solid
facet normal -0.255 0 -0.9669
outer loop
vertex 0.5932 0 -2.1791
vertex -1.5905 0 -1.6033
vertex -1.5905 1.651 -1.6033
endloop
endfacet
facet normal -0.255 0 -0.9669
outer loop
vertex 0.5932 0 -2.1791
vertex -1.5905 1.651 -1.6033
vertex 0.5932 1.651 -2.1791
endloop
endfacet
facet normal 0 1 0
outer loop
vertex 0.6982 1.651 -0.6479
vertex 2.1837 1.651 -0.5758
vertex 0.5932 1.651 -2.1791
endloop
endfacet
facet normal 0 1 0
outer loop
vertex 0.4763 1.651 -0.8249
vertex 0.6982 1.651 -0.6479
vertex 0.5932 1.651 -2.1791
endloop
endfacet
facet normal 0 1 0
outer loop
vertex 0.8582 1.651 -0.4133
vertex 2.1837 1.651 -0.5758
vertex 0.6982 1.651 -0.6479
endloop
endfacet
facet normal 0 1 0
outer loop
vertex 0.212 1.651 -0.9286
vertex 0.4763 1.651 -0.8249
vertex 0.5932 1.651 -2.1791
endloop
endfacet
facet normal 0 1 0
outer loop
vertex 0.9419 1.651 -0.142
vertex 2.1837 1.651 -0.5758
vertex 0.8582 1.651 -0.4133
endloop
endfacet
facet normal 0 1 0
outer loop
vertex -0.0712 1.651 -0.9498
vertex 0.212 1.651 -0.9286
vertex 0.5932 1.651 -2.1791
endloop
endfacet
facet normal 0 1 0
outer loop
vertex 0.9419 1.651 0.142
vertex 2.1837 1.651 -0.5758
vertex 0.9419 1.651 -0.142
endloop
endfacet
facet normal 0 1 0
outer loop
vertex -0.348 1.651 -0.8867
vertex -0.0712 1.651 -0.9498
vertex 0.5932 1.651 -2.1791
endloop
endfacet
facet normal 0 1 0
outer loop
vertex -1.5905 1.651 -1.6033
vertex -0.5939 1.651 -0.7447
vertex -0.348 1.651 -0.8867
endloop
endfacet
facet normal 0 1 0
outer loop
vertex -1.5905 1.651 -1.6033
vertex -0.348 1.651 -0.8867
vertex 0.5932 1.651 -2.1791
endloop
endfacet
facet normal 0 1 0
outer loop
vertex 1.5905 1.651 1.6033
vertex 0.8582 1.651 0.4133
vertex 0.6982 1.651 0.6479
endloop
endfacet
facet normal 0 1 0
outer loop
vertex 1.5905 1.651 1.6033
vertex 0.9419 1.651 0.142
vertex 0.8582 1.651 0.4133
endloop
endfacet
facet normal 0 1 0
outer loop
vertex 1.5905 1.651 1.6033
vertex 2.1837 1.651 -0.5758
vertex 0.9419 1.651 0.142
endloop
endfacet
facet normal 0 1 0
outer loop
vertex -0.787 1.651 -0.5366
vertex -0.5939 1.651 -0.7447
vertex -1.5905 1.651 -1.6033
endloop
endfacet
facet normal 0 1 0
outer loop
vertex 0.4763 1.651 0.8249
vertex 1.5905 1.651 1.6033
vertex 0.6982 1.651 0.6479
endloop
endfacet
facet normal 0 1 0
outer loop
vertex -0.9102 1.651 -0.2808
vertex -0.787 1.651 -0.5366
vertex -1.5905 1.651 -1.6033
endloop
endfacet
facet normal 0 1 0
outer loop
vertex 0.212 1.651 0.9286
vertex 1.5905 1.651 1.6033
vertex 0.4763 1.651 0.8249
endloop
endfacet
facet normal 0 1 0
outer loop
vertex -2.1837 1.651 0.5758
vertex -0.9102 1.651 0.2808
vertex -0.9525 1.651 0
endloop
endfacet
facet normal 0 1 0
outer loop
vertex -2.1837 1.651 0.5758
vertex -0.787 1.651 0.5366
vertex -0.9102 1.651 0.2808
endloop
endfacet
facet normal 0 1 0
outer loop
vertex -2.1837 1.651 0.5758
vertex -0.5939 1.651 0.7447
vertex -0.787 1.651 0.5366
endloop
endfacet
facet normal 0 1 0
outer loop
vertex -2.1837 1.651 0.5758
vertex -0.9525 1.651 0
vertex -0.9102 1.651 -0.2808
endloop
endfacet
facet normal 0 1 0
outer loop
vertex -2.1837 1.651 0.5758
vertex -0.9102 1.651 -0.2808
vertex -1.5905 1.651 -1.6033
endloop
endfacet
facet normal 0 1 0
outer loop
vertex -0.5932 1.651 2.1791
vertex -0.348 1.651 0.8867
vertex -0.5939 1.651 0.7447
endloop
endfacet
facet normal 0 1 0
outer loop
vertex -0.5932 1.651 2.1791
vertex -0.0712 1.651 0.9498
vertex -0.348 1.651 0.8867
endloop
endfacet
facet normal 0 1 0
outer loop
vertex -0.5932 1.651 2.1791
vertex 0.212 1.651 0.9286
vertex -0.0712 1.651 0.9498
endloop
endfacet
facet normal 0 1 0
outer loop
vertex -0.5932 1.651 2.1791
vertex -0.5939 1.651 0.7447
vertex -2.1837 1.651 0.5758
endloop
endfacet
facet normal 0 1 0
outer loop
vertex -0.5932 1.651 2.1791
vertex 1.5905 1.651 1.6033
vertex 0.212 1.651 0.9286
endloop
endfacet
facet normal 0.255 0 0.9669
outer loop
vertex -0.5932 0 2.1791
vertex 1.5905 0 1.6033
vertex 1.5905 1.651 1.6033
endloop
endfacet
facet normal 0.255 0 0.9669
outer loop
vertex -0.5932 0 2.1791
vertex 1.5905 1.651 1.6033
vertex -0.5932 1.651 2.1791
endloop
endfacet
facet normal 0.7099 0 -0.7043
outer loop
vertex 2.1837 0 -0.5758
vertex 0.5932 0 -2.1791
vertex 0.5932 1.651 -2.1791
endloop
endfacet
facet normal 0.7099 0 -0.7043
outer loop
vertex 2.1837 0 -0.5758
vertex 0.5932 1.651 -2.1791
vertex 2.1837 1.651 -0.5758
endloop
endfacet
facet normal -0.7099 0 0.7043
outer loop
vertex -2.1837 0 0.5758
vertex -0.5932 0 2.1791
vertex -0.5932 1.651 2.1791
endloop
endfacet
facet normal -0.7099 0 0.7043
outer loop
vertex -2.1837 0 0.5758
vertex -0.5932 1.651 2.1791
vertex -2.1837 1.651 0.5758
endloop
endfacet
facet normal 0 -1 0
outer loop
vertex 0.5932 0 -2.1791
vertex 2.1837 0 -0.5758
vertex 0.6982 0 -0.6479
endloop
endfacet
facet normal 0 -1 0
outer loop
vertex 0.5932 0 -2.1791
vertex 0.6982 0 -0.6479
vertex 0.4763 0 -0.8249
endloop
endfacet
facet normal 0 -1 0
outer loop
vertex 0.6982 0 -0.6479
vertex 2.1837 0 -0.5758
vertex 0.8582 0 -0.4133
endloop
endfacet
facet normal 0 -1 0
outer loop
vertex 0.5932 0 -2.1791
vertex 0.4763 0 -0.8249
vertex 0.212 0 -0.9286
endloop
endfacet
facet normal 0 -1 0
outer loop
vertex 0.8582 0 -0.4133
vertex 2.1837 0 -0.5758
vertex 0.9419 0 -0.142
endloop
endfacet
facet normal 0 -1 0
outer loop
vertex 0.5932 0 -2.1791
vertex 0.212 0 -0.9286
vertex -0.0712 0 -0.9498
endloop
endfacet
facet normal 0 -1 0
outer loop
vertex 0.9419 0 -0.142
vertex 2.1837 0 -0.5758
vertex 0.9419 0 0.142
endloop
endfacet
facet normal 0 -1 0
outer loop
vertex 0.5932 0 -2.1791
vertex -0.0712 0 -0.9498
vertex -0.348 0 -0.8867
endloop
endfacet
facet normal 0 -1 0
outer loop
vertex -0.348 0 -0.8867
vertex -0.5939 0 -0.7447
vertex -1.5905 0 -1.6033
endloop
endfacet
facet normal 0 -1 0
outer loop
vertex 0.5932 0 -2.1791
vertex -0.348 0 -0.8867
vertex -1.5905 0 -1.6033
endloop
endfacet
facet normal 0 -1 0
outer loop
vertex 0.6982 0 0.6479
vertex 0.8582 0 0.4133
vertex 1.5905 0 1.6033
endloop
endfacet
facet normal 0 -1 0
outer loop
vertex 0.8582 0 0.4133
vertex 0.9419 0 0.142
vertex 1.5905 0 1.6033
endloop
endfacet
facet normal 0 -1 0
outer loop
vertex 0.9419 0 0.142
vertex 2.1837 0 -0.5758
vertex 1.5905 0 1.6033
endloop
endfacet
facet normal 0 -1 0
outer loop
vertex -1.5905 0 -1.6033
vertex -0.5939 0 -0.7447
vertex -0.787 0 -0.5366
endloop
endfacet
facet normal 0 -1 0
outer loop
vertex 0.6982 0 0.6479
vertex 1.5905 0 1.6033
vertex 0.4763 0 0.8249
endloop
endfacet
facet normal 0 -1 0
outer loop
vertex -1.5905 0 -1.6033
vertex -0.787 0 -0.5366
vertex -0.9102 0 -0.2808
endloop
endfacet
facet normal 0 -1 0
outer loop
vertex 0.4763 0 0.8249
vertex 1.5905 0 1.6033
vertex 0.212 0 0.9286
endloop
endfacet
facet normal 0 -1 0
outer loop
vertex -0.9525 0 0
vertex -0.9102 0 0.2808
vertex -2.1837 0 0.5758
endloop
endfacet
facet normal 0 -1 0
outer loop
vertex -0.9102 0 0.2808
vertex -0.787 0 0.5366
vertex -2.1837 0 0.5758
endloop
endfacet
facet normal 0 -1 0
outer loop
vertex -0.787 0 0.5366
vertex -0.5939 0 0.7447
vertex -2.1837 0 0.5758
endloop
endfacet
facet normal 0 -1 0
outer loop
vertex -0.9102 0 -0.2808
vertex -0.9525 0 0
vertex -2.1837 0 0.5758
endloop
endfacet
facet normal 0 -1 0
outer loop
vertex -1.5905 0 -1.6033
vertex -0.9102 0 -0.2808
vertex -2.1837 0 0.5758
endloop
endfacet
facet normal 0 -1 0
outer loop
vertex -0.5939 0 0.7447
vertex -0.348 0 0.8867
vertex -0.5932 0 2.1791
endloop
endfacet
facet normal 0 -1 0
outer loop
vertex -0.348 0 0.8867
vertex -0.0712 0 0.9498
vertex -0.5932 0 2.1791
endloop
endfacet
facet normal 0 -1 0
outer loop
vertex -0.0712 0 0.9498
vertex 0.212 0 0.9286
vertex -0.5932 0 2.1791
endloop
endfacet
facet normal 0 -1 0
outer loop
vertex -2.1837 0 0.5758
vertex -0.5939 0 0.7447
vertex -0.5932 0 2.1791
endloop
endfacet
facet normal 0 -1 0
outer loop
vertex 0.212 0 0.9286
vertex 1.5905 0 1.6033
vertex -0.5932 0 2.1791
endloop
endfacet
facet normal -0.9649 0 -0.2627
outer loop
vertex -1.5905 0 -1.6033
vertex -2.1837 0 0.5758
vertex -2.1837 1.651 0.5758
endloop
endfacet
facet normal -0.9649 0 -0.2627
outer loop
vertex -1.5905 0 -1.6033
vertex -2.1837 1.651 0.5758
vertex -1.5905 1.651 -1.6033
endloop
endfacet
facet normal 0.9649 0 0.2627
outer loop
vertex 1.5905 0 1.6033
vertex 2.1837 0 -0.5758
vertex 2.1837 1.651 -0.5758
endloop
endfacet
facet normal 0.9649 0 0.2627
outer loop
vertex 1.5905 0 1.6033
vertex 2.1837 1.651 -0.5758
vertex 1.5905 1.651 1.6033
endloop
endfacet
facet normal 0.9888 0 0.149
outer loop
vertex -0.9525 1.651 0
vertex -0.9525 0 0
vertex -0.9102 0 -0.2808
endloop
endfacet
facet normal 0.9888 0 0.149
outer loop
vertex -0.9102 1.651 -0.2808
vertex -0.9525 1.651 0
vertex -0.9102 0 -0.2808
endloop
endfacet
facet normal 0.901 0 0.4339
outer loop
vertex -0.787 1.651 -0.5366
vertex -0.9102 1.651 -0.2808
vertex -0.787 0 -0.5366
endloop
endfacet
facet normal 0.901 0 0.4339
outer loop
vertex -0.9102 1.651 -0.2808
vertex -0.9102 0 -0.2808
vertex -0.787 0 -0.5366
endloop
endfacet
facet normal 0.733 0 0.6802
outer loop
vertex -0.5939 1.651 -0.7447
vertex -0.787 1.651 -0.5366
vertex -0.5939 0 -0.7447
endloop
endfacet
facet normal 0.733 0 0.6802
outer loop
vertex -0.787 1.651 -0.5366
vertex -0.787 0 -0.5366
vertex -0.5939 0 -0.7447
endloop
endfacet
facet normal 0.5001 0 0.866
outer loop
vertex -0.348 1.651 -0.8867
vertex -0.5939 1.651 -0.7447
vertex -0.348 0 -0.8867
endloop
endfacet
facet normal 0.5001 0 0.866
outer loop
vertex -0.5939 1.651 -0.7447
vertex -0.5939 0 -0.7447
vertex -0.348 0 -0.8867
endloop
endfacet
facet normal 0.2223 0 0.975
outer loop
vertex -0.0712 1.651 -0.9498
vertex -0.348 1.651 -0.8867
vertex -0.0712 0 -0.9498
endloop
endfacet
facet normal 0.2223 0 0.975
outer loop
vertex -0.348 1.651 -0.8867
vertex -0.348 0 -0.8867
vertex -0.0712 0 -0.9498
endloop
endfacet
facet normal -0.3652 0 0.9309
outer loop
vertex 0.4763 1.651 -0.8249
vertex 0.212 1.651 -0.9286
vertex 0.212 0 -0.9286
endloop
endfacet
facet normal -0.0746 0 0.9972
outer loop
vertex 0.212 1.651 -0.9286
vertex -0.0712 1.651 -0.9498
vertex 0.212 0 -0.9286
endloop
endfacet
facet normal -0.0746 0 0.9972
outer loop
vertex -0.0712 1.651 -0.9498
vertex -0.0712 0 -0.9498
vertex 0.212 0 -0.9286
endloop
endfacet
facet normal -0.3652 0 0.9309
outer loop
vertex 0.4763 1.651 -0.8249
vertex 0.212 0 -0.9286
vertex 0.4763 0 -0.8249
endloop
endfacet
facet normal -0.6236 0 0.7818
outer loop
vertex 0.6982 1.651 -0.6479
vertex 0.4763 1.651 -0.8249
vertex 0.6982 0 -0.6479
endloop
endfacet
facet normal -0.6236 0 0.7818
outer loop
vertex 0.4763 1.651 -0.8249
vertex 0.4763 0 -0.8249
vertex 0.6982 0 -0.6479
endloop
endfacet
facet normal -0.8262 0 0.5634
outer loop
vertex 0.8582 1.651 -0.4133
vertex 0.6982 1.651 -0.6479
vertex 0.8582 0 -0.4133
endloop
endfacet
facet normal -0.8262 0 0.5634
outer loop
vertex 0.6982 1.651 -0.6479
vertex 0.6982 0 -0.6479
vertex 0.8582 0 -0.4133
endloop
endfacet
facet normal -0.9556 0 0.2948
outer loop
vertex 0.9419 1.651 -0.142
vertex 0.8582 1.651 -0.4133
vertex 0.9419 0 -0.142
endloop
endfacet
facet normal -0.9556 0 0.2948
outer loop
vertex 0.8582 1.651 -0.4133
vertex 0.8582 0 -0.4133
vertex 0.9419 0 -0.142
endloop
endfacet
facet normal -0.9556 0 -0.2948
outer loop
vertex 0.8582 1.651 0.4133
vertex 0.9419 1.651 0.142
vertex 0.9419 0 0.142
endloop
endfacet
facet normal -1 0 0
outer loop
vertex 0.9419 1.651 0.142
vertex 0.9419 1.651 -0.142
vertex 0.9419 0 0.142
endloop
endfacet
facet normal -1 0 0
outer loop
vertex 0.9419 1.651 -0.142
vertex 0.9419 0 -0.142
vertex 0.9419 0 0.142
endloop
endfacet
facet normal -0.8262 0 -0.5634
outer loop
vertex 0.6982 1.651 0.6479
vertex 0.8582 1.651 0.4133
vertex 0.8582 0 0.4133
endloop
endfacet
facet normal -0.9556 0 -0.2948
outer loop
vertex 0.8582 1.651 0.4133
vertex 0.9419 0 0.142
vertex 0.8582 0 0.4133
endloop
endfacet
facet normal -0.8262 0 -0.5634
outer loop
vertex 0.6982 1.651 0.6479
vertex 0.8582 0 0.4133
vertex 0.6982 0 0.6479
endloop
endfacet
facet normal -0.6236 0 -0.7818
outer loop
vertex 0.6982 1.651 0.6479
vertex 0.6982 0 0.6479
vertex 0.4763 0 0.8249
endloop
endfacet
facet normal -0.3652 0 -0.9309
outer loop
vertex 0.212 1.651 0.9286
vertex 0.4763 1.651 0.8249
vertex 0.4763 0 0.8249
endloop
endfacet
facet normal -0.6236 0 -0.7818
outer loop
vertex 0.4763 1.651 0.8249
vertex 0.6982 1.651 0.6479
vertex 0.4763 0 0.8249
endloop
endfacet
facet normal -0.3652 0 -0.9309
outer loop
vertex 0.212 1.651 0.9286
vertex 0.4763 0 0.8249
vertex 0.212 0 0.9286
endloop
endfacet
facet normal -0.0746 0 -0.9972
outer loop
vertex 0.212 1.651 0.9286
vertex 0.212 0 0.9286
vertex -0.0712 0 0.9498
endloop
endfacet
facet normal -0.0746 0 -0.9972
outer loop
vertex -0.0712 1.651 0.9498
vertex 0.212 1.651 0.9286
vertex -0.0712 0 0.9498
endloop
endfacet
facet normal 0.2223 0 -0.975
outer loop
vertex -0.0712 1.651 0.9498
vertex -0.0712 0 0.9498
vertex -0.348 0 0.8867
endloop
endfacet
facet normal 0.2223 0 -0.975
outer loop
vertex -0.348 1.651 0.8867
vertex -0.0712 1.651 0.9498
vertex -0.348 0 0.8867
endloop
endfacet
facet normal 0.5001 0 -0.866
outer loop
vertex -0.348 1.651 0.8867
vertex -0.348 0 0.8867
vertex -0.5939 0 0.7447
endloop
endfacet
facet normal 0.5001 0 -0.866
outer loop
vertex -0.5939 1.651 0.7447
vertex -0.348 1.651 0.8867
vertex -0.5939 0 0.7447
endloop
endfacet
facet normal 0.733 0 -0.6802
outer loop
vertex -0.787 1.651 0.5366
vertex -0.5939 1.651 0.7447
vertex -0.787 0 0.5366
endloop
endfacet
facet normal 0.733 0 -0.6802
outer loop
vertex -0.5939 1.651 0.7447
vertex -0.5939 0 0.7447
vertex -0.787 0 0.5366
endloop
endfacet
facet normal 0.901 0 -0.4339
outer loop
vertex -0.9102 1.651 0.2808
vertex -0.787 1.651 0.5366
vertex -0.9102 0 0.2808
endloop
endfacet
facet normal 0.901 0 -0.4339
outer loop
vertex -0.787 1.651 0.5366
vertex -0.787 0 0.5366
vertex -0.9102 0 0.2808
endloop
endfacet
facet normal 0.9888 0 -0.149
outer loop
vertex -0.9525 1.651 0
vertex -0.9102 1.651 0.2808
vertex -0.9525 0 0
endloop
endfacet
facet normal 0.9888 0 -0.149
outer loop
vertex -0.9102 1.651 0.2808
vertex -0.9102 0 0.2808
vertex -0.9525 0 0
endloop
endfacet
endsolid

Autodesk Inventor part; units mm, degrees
ref_plane "YZ Plane" through (0, 0, 0) normal (1, 0, 0) x (0, 1, 0)
ref_plane "XZ Plane" through (0, 0, 0) normal (0, 1, 0) x (-1, 0, 0)
ref_plane "XY Plane" through (0, 0, 0) normal (0, 0, 1) x (1, 0, 0)
sketch "Sketch1" plane through (0, 0, 0) normal (0, 1, 0) x (-1, 0, 0)
  line L0 (-1.5905, 1.6033) -> (0.5932, 2.1791)
  line L1 (0.5932, 2.1791) -> (2.1837, 0.5758)
  line L2 (2.1837, 0.5758) -> (1.5905, -1.6033)
  line L3 (1.5905, -1.6033) -> (-0.5932, -2.1791)
  line L4 (-0.5932, -2.1791) -> (-2.1837, -0.5758)
  line L5 (-2.1837, -0.5758) -> (-1.5905, 1.6033)
  circle A0 centre (0, 0) radius 0.9525
  dimension "d0" = 3.9116
  dimension "d1" = 1.905
extrude "Extrusion1" add sketch "Sketch1" along normal blind 1.651
thread "Thread1" size "0-80 UNF" class "2B" standard "ANSI Unified Screw Threads" full length
properties part number "nut for sqrew long" material "Aluminum 6061"
